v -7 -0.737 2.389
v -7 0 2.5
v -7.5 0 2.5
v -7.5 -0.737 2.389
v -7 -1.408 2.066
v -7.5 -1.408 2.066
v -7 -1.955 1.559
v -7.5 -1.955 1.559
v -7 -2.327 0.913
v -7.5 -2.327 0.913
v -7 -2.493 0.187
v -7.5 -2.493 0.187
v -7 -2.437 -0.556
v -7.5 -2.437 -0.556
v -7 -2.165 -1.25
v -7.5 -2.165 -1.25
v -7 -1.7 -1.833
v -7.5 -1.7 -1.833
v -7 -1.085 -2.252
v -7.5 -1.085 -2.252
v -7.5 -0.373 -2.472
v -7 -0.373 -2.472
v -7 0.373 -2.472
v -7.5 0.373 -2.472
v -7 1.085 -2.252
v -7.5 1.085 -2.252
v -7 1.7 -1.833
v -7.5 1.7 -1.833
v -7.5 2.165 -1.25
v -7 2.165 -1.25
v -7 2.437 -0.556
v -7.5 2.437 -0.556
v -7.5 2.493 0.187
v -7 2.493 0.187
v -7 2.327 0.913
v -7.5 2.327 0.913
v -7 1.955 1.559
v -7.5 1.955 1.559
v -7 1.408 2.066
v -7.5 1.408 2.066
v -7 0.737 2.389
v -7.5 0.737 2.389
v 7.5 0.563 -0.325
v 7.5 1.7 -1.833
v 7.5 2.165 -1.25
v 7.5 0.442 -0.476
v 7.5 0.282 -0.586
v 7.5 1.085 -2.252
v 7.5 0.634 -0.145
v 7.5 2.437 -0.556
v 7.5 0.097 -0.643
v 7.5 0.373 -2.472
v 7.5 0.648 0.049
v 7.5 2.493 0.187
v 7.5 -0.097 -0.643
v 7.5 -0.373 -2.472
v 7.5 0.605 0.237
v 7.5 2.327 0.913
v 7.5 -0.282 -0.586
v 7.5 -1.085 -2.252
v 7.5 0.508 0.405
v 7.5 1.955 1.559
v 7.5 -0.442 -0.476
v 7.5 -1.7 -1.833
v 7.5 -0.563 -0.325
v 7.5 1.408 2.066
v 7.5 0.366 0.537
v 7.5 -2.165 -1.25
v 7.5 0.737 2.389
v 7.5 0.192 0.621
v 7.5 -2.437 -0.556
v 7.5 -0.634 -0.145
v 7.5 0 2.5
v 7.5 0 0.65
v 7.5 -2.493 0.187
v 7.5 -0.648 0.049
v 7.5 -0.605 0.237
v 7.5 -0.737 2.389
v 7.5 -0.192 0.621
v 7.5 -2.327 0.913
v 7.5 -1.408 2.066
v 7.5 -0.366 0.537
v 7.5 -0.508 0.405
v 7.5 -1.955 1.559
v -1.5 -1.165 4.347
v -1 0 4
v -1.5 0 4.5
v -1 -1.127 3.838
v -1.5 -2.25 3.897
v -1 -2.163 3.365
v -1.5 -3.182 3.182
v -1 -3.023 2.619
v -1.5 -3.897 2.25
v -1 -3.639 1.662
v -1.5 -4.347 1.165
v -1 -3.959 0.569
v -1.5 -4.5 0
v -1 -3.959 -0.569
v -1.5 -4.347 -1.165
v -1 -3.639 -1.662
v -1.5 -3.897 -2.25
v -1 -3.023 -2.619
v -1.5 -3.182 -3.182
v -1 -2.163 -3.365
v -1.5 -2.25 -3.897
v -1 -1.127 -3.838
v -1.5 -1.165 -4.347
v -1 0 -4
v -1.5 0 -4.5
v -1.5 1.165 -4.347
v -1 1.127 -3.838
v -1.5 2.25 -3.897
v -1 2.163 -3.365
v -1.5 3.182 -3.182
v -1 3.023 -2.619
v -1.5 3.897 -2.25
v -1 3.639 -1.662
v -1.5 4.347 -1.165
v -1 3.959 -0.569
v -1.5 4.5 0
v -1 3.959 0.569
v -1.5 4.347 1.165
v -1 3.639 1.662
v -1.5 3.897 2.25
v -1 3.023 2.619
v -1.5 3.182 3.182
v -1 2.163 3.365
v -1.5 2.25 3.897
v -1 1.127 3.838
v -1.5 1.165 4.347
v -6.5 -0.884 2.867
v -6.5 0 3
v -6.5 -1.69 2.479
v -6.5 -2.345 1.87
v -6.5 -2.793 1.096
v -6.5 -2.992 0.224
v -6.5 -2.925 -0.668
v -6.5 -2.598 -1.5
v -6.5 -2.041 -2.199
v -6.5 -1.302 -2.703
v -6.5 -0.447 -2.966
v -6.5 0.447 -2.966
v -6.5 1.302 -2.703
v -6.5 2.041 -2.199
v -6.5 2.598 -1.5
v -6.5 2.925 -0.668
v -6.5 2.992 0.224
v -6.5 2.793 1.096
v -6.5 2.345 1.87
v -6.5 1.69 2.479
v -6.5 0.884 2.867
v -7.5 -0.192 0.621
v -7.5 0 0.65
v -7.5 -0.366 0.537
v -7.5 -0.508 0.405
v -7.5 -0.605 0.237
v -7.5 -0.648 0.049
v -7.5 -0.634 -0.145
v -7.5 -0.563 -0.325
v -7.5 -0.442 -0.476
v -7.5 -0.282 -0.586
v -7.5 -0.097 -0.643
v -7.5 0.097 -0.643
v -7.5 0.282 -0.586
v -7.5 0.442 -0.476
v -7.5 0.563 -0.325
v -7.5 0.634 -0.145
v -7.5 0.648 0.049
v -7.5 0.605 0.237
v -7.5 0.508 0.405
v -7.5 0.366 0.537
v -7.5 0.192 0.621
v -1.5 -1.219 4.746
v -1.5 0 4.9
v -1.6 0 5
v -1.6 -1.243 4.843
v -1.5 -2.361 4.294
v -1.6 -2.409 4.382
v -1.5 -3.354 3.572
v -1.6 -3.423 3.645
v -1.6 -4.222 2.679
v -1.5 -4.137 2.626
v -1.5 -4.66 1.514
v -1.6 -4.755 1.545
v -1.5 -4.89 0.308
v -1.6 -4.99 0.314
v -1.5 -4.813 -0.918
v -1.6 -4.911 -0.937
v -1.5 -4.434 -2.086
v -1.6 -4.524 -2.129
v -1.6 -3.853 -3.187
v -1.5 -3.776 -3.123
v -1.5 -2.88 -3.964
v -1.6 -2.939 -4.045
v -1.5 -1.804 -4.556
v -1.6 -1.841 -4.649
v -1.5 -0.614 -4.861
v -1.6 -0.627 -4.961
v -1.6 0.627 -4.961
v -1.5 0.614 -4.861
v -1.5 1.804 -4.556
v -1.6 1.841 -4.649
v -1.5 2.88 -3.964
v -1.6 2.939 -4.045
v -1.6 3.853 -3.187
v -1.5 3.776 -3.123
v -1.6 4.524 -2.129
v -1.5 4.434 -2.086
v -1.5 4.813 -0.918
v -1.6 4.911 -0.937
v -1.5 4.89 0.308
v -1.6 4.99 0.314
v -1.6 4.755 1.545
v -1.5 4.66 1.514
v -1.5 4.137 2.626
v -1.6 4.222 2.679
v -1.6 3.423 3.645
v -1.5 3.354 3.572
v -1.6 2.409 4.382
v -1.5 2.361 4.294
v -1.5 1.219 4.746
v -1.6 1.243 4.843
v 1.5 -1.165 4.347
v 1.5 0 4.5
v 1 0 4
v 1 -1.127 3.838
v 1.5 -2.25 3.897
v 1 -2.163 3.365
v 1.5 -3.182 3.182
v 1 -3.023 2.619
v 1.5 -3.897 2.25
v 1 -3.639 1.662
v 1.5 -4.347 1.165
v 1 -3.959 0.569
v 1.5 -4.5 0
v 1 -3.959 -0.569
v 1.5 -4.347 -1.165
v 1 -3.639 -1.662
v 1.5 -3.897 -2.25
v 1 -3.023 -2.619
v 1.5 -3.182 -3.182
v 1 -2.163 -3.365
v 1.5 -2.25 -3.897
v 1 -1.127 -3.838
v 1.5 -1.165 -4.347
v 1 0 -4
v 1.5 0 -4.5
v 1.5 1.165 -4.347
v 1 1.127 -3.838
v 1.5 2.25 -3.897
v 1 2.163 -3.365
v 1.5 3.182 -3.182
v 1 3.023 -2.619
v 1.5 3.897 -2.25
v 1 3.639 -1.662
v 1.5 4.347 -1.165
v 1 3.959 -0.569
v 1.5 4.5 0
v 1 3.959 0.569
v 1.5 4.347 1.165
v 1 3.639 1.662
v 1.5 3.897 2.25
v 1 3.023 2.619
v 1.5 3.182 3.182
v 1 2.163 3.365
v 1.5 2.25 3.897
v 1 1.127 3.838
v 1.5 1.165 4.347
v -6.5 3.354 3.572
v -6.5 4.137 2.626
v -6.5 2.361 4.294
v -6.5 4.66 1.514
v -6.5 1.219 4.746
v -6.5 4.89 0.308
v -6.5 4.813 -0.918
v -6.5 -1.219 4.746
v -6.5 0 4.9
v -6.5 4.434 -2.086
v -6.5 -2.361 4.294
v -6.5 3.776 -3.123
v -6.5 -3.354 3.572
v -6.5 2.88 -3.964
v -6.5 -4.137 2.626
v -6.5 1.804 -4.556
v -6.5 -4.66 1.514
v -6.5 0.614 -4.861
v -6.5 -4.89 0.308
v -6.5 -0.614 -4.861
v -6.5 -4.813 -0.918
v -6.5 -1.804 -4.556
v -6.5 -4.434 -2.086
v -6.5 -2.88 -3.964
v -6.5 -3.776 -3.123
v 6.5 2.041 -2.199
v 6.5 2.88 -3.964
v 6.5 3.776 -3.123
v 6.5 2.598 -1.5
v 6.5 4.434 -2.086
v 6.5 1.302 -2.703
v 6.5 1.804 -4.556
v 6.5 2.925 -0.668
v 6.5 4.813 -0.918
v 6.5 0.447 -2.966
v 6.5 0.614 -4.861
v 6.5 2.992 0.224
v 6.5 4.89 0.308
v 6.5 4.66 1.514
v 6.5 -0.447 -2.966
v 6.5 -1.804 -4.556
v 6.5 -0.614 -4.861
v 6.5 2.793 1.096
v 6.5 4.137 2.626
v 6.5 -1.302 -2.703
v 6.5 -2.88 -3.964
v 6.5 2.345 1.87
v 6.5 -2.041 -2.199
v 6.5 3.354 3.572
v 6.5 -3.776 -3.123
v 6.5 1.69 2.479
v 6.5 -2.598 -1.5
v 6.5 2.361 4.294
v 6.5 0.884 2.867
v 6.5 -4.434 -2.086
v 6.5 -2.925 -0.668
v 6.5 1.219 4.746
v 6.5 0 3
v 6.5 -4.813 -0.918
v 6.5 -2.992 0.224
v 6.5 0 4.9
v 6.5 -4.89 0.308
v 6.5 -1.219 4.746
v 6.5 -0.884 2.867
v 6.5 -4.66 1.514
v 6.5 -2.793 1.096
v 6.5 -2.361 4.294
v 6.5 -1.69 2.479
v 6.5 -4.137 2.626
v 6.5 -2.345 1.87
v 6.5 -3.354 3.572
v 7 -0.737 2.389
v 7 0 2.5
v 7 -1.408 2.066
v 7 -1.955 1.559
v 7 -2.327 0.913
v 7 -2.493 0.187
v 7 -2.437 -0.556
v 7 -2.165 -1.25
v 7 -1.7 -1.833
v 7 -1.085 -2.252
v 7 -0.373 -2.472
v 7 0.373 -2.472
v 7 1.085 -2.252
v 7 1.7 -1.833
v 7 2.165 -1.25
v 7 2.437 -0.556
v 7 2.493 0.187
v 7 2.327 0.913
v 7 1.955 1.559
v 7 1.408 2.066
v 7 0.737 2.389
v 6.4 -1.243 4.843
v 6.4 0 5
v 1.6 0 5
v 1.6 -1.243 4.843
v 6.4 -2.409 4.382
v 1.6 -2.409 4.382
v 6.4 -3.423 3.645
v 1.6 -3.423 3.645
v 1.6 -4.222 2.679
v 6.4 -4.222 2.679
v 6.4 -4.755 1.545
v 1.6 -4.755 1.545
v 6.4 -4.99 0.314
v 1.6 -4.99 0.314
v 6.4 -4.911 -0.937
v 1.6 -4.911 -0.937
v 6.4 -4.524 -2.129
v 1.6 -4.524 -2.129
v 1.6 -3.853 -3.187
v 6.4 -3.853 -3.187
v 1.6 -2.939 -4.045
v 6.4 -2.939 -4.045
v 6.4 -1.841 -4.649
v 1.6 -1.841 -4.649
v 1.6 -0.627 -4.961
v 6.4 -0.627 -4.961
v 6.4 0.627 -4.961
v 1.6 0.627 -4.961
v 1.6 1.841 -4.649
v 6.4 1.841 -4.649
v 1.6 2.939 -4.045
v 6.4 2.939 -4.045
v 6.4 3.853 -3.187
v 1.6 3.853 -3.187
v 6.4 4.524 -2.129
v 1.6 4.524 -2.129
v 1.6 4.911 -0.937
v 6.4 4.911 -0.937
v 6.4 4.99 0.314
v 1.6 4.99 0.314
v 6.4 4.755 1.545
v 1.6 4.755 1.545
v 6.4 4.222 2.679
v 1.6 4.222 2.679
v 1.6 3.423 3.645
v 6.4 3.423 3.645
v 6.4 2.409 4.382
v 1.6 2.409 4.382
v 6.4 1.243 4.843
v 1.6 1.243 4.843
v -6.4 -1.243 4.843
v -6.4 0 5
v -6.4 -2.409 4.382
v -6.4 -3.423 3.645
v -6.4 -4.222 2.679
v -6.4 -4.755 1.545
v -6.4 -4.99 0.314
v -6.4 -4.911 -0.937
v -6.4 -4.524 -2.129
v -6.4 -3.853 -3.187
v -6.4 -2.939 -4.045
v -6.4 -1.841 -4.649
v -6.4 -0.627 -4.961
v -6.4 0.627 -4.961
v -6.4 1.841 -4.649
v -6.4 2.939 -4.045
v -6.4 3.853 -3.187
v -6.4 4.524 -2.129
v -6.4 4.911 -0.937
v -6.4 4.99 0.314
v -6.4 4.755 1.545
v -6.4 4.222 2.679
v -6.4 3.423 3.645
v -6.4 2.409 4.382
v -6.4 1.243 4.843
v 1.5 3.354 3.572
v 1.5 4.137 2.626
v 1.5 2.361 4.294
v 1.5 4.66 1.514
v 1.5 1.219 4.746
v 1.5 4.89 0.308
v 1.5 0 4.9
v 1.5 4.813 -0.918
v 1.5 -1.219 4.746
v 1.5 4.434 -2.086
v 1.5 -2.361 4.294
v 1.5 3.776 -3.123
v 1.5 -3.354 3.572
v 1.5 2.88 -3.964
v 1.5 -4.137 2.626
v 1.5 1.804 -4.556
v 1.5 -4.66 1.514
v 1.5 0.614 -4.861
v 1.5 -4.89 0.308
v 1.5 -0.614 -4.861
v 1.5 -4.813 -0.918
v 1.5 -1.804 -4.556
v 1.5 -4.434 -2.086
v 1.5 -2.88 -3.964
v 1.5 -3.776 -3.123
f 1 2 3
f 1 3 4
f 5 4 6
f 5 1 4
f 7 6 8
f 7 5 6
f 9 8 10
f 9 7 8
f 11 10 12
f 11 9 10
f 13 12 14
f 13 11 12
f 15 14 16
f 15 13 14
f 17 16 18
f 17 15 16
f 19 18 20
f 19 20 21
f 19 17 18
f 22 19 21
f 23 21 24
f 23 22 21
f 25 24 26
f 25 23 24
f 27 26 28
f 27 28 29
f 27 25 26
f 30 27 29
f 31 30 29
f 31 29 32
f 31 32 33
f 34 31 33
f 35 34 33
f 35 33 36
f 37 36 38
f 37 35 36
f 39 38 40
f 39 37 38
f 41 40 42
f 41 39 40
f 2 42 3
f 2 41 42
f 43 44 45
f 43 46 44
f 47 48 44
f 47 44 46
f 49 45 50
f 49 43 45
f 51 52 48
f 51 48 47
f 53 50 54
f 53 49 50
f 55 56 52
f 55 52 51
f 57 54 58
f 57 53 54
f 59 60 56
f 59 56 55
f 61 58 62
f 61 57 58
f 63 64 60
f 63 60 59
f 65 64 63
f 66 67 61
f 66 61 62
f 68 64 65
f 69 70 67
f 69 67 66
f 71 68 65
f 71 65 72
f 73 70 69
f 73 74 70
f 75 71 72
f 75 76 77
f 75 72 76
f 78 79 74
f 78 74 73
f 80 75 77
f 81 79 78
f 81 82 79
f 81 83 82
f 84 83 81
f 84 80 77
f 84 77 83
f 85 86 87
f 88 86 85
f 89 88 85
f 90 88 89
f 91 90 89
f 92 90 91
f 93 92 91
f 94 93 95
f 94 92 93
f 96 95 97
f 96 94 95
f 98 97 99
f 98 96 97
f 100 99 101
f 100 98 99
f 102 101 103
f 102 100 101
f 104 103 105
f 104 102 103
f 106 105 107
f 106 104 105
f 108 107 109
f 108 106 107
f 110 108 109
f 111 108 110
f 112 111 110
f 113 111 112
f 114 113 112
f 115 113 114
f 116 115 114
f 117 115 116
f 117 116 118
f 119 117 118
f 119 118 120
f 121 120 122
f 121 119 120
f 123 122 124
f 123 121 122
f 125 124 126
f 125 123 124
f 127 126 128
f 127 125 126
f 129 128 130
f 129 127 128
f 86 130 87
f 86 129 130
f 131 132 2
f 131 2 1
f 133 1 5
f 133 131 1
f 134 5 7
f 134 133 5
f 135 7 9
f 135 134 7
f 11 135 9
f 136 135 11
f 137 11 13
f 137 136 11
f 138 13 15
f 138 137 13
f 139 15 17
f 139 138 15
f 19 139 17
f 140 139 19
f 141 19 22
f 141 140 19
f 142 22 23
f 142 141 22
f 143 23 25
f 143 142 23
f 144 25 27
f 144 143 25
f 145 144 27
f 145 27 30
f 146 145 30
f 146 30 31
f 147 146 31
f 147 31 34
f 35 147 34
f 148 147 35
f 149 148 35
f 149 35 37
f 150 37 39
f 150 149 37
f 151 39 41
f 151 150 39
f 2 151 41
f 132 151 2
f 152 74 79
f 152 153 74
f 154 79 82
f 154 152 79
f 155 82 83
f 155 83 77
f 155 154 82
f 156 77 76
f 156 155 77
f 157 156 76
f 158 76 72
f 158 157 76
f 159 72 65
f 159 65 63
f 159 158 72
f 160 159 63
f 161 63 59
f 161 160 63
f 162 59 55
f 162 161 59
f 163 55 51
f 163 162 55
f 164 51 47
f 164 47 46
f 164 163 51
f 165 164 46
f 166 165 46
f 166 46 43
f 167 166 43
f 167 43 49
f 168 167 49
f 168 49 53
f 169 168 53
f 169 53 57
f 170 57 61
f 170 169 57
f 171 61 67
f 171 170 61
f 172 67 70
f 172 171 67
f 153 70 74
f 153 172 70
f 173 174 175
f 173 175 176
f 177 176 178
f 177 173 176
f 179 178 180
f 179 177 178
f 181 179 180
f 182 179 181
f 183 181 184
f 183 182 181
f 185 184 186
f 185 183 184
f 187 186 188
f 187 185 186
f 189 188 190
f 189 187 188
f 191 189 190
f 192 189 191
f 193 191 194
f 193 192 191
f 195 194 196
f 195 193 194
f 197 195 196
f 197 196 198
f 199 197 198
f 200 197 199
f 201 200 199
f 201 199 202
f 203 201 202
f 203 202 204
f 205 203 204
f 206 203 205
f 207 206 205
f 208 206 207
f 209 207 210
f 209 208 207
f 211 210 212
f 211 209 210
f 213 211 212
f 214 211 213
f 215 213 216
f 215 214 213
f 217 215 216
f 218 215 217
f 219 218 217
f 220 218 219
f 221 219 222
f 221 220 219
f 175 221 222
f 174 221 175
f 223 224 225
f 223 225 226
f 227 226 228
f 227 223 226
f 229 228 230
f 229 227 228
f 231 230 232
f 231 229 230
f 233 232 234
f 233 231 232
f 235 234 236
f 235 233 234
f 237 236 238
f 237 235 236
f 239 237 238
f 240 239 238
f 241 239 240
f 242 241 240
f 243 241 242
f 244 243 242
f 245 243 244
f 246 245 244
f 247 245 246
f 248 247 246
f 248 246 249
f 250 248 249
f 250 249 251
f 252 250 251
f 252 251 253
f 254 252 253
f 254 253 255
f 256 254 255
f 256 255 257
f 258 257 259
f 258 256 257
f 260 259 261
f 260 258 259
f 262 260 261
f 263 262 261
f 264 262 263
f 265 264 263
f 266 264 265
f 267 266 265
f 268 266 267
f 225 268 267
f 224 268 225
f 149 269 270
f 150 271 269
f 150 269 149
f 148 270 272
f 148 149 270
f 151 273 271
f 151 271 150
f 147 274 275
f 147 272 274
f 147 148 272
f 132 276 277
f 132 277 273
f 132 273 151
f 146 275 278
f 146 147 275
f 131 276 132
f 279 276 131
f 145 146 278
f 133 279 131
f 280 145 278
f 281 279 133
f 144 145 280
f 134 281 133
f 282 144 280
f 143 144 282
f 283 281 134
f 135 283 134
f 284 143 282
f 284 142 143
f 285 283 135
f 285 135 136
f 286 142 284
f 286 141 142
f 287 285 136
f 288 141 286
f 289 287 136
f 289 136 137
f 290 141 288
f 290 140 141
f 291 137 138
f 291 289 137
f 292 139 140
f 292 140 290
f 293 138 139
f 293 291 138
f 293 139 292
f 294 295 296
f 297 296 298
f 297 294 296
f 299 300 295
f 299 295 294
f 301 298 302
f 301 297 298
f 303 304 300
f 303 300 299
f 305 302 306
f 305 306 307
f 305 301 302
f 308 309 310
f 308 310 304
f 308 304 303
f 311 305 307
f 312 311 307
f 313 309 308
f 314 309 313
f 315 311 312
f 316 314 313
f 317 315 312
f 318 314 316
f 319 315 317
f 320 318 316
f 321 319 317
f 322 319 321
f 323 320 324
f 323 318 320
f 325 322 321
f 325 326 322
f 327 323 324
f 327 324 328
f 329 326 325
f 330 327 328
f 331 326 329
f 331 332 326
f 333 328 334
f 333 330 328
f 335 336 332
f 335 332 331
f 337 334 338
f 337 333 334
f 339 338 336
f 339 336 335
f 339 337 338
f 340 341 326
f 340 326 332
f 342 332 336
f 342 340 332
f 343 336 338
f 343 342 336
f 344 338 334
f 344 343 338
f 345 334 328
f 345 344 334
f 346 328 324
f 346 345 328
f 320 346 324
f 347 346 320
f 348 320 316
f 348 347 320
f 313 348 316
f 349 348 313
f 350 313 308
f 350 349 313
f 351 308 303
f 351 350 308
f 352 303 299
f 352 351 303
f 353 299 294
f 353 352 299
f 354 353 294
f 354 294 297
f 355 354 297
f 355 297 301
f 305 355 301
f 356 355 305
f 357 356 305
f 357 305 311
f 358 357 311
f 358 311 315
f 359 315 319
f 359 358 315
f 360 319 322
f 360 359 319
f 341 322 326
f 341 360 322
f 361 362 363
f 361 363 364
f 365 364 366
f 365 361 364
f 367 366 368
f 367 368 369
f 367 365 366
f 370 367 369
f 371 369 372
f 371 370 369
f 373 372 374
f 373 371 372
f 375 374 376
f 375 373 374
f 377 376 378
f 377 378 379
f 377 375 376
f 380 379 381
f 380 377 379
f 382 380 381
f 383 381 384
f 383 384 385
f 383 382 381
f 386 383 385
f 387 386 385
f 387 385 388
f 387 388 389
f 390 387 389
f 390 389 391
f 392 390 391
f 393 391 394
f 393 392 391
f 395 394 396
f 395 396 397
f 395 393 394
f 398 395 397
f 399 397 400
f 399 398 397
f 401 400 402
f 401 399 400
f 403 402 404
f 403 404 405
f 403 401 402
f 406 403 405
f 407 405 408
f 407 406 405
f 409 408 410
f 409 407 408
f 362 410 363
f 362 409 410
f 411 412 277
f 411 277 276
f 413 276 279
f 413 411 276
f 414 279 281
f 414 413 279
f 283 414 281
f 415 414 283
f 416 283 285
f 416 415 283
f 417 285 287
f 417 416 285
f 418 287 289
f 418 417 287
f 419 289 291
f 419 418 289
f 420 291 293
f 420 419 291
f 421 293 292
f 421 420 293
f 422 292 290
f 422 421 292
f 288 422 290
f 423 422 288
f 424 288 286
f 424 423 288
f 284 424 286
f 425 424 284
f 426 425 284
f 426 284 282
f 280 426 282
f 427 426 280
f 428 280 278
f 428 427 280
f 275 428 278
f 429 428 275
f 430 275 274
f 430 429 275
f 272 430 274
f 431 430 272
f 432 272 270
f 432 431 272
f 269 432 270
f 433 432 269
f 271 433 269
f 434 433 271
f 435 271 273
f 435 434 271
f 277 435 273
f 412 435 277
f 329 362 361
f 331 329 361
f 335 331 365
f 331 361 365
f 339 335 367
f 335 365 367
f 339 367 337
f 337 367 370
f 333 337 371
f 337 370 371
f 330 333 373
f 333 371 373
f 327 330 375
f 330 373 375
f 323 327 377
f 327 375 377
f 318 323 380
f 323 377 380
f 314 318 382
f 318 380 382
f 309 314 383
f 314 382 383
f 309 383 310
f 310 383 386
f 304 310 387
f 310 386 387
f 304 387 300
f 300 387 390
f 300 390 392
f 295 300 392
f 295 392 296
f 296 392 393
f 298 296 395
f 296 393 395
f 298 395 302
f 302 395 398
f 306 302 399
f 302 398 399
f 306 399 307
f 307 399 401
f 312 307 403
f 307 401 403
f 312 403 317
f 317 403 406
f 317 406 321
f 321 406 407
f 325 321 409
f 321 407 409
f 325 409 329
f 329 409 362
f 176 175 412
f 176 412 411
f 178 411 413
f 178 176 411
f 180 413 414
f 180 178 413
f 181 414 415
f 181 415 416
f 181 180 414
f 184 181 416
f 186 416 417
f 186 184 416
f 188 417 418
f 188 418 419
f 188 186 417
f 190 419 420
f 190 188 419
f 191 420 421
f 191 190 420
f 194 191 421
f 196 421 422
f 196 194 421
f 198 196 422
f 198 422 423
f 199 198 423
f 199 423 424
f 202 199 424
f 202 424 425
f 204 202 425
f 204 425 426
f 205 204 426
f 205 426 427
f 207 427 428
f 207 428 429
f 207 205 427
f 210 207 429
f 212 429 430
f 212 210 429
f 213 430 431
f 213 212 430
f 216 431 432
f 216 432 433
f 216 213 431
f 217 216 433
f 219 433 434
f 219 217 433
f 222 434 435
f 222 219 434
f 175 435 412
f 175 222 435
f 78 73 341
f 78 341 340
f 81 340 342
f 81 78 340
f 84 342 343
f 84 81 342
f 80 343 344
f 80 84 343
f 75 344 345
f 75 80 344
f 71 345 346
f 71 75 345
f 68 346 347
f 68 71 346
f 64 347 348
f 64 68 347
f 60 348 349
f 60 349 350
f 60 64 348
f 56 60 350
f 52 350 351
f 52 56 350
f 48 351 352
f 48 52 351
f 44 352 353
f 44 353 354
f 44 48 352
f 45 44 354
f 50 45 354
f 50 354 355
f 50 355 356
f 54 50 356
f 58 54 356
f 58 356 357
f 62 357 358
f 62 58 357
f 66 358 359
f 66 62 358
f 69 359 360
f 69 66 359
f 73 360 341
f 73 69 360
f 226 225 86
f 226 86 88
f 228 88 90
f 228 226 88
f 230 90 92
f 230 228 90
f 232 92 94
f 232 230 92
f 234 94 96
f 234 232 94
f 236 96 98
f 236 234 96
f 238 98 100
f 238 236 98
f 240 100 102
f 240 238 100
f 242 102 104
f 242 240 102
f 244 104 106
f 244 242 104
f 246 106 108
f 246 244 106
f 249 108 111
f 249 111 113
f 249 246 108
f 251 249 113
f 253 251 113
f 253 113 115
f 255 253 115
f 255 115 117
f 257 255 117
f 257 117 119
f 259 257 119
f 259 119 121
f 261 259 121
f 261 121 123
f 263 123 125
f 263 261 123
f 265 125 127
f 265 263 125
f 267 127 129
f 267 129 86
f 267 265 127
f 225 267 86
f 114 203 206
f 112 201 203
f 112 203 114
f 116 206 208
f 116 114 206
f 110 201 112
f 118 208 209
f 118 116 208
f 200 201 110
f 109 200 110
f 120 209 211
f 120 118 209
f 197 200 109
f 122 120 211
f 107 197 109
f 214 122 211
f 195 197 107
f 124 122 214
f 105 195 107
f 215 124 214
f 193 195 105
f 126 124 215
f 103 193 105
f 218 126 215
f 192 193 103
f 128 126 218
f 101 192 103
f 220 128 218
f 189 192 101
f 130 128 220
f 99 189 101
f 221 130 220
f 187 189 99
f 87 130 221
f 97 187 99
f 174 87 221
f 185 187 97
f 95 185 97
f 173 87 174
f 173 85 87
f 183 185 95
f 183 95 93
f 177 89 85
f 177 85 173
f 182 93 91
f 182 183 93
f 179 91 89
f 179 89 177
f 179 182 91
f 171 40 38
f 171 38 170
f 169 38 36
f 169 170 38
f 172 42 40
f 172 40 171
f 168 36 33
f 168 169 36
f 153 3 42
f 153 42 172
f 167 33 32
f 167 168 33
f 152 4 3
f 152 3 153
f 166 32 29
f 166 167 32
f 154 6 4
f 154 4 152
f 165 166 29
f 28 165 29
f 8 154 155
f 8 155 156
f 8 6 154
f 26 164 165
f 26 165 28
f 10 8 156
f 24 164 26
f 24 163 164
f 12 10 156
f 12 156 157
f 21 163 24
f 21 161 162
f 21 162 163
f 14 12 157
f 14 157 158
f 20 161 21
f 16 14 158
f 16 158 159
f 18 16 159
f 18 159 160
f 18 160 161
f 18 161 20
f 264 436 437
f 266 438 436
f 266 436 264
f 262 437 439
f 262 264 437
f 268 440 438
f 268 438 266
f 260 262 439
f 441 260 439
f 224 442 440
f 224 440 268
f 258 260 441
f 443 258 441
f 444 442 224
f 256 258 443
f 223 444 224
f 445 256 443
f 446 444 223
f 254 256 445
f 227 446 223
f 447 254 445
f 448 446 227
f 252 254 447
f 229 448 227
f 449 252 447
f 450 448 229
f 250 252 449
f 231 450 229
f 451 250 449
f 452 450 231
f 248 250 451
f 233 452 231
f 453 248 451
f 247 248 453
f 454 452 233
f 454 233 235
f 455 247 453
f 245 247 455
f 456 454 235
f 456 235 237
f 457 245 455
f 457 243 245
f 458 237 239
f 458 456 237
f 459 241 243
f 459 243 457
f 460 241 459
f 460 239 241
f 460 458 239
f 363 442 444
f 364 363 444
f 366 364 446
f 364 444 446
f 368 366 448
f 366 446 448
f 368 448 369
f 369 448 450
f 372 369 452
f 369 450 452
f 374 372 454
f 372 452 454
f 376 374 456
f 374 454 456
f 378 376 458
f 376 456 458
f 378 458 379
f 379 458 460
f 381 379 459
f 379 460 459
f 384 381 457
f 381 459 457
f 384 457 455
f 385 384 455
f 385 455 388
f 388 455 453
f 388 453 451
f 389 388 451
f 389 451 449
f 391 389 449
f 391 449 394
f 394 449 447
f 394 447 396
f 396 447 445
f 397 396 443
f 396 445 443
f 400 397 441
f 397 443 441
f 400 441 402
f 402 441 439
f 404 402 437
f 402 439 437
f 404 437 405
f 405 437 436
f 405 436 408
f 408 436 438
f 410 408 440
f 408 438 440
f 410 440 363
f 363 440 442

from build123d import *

# Parameters (mm, degrees)
FASE1_SIZE = 0.5
FASE2_SIZE = 0.1


with BuildPart() as part:
    # Skizze1 → Rotation1 (revolve)
    with BuildSketch(Plane.XY, mode=Mode.PRIVATE) as rotation1_sk:
        Polygon((-7.5, 2.5), (-6.5, 2.5), (-6.5, 5), (-1.5, 5), (-1.5, 4), (1.5, 4), (1.5, 5), (6.5, 5), (6.5, 2.5), (7.5, 2.5), (7.5, 0.65), (-7.5, 0.65), align=None)
    revolve(rotation1_sk.sketch.rotate(Axis((-7.5, 0, 0), (1, 0, 0)), 90), axis=Axis((-7.5, 0, 0), (1, 0, 0)))

    # Fase1
    fase1_edges = [part.edges().sort_by_distance(p)[0] for p in [
        (6.5, 0, -2.5),
        (1.5, 0, -4),
        (-1.5, 0, -4),
        (-6.5, 0, -2.5),
    ]]
    chamfer(fase1_edges, length=FASE1_SIZE)

    # Fase2
    fase2_edges = [part.edges().sort_by_distance(p)[0] for p in [
        (6.5, 0, -5),
        (1.5, 0, -5),
        (-1.5, 0, -5),
        (-6.5, 0, -5),
    ]]
    chamfer(fase2_edges, length=FASE2_SIZE)


solid = part.part
